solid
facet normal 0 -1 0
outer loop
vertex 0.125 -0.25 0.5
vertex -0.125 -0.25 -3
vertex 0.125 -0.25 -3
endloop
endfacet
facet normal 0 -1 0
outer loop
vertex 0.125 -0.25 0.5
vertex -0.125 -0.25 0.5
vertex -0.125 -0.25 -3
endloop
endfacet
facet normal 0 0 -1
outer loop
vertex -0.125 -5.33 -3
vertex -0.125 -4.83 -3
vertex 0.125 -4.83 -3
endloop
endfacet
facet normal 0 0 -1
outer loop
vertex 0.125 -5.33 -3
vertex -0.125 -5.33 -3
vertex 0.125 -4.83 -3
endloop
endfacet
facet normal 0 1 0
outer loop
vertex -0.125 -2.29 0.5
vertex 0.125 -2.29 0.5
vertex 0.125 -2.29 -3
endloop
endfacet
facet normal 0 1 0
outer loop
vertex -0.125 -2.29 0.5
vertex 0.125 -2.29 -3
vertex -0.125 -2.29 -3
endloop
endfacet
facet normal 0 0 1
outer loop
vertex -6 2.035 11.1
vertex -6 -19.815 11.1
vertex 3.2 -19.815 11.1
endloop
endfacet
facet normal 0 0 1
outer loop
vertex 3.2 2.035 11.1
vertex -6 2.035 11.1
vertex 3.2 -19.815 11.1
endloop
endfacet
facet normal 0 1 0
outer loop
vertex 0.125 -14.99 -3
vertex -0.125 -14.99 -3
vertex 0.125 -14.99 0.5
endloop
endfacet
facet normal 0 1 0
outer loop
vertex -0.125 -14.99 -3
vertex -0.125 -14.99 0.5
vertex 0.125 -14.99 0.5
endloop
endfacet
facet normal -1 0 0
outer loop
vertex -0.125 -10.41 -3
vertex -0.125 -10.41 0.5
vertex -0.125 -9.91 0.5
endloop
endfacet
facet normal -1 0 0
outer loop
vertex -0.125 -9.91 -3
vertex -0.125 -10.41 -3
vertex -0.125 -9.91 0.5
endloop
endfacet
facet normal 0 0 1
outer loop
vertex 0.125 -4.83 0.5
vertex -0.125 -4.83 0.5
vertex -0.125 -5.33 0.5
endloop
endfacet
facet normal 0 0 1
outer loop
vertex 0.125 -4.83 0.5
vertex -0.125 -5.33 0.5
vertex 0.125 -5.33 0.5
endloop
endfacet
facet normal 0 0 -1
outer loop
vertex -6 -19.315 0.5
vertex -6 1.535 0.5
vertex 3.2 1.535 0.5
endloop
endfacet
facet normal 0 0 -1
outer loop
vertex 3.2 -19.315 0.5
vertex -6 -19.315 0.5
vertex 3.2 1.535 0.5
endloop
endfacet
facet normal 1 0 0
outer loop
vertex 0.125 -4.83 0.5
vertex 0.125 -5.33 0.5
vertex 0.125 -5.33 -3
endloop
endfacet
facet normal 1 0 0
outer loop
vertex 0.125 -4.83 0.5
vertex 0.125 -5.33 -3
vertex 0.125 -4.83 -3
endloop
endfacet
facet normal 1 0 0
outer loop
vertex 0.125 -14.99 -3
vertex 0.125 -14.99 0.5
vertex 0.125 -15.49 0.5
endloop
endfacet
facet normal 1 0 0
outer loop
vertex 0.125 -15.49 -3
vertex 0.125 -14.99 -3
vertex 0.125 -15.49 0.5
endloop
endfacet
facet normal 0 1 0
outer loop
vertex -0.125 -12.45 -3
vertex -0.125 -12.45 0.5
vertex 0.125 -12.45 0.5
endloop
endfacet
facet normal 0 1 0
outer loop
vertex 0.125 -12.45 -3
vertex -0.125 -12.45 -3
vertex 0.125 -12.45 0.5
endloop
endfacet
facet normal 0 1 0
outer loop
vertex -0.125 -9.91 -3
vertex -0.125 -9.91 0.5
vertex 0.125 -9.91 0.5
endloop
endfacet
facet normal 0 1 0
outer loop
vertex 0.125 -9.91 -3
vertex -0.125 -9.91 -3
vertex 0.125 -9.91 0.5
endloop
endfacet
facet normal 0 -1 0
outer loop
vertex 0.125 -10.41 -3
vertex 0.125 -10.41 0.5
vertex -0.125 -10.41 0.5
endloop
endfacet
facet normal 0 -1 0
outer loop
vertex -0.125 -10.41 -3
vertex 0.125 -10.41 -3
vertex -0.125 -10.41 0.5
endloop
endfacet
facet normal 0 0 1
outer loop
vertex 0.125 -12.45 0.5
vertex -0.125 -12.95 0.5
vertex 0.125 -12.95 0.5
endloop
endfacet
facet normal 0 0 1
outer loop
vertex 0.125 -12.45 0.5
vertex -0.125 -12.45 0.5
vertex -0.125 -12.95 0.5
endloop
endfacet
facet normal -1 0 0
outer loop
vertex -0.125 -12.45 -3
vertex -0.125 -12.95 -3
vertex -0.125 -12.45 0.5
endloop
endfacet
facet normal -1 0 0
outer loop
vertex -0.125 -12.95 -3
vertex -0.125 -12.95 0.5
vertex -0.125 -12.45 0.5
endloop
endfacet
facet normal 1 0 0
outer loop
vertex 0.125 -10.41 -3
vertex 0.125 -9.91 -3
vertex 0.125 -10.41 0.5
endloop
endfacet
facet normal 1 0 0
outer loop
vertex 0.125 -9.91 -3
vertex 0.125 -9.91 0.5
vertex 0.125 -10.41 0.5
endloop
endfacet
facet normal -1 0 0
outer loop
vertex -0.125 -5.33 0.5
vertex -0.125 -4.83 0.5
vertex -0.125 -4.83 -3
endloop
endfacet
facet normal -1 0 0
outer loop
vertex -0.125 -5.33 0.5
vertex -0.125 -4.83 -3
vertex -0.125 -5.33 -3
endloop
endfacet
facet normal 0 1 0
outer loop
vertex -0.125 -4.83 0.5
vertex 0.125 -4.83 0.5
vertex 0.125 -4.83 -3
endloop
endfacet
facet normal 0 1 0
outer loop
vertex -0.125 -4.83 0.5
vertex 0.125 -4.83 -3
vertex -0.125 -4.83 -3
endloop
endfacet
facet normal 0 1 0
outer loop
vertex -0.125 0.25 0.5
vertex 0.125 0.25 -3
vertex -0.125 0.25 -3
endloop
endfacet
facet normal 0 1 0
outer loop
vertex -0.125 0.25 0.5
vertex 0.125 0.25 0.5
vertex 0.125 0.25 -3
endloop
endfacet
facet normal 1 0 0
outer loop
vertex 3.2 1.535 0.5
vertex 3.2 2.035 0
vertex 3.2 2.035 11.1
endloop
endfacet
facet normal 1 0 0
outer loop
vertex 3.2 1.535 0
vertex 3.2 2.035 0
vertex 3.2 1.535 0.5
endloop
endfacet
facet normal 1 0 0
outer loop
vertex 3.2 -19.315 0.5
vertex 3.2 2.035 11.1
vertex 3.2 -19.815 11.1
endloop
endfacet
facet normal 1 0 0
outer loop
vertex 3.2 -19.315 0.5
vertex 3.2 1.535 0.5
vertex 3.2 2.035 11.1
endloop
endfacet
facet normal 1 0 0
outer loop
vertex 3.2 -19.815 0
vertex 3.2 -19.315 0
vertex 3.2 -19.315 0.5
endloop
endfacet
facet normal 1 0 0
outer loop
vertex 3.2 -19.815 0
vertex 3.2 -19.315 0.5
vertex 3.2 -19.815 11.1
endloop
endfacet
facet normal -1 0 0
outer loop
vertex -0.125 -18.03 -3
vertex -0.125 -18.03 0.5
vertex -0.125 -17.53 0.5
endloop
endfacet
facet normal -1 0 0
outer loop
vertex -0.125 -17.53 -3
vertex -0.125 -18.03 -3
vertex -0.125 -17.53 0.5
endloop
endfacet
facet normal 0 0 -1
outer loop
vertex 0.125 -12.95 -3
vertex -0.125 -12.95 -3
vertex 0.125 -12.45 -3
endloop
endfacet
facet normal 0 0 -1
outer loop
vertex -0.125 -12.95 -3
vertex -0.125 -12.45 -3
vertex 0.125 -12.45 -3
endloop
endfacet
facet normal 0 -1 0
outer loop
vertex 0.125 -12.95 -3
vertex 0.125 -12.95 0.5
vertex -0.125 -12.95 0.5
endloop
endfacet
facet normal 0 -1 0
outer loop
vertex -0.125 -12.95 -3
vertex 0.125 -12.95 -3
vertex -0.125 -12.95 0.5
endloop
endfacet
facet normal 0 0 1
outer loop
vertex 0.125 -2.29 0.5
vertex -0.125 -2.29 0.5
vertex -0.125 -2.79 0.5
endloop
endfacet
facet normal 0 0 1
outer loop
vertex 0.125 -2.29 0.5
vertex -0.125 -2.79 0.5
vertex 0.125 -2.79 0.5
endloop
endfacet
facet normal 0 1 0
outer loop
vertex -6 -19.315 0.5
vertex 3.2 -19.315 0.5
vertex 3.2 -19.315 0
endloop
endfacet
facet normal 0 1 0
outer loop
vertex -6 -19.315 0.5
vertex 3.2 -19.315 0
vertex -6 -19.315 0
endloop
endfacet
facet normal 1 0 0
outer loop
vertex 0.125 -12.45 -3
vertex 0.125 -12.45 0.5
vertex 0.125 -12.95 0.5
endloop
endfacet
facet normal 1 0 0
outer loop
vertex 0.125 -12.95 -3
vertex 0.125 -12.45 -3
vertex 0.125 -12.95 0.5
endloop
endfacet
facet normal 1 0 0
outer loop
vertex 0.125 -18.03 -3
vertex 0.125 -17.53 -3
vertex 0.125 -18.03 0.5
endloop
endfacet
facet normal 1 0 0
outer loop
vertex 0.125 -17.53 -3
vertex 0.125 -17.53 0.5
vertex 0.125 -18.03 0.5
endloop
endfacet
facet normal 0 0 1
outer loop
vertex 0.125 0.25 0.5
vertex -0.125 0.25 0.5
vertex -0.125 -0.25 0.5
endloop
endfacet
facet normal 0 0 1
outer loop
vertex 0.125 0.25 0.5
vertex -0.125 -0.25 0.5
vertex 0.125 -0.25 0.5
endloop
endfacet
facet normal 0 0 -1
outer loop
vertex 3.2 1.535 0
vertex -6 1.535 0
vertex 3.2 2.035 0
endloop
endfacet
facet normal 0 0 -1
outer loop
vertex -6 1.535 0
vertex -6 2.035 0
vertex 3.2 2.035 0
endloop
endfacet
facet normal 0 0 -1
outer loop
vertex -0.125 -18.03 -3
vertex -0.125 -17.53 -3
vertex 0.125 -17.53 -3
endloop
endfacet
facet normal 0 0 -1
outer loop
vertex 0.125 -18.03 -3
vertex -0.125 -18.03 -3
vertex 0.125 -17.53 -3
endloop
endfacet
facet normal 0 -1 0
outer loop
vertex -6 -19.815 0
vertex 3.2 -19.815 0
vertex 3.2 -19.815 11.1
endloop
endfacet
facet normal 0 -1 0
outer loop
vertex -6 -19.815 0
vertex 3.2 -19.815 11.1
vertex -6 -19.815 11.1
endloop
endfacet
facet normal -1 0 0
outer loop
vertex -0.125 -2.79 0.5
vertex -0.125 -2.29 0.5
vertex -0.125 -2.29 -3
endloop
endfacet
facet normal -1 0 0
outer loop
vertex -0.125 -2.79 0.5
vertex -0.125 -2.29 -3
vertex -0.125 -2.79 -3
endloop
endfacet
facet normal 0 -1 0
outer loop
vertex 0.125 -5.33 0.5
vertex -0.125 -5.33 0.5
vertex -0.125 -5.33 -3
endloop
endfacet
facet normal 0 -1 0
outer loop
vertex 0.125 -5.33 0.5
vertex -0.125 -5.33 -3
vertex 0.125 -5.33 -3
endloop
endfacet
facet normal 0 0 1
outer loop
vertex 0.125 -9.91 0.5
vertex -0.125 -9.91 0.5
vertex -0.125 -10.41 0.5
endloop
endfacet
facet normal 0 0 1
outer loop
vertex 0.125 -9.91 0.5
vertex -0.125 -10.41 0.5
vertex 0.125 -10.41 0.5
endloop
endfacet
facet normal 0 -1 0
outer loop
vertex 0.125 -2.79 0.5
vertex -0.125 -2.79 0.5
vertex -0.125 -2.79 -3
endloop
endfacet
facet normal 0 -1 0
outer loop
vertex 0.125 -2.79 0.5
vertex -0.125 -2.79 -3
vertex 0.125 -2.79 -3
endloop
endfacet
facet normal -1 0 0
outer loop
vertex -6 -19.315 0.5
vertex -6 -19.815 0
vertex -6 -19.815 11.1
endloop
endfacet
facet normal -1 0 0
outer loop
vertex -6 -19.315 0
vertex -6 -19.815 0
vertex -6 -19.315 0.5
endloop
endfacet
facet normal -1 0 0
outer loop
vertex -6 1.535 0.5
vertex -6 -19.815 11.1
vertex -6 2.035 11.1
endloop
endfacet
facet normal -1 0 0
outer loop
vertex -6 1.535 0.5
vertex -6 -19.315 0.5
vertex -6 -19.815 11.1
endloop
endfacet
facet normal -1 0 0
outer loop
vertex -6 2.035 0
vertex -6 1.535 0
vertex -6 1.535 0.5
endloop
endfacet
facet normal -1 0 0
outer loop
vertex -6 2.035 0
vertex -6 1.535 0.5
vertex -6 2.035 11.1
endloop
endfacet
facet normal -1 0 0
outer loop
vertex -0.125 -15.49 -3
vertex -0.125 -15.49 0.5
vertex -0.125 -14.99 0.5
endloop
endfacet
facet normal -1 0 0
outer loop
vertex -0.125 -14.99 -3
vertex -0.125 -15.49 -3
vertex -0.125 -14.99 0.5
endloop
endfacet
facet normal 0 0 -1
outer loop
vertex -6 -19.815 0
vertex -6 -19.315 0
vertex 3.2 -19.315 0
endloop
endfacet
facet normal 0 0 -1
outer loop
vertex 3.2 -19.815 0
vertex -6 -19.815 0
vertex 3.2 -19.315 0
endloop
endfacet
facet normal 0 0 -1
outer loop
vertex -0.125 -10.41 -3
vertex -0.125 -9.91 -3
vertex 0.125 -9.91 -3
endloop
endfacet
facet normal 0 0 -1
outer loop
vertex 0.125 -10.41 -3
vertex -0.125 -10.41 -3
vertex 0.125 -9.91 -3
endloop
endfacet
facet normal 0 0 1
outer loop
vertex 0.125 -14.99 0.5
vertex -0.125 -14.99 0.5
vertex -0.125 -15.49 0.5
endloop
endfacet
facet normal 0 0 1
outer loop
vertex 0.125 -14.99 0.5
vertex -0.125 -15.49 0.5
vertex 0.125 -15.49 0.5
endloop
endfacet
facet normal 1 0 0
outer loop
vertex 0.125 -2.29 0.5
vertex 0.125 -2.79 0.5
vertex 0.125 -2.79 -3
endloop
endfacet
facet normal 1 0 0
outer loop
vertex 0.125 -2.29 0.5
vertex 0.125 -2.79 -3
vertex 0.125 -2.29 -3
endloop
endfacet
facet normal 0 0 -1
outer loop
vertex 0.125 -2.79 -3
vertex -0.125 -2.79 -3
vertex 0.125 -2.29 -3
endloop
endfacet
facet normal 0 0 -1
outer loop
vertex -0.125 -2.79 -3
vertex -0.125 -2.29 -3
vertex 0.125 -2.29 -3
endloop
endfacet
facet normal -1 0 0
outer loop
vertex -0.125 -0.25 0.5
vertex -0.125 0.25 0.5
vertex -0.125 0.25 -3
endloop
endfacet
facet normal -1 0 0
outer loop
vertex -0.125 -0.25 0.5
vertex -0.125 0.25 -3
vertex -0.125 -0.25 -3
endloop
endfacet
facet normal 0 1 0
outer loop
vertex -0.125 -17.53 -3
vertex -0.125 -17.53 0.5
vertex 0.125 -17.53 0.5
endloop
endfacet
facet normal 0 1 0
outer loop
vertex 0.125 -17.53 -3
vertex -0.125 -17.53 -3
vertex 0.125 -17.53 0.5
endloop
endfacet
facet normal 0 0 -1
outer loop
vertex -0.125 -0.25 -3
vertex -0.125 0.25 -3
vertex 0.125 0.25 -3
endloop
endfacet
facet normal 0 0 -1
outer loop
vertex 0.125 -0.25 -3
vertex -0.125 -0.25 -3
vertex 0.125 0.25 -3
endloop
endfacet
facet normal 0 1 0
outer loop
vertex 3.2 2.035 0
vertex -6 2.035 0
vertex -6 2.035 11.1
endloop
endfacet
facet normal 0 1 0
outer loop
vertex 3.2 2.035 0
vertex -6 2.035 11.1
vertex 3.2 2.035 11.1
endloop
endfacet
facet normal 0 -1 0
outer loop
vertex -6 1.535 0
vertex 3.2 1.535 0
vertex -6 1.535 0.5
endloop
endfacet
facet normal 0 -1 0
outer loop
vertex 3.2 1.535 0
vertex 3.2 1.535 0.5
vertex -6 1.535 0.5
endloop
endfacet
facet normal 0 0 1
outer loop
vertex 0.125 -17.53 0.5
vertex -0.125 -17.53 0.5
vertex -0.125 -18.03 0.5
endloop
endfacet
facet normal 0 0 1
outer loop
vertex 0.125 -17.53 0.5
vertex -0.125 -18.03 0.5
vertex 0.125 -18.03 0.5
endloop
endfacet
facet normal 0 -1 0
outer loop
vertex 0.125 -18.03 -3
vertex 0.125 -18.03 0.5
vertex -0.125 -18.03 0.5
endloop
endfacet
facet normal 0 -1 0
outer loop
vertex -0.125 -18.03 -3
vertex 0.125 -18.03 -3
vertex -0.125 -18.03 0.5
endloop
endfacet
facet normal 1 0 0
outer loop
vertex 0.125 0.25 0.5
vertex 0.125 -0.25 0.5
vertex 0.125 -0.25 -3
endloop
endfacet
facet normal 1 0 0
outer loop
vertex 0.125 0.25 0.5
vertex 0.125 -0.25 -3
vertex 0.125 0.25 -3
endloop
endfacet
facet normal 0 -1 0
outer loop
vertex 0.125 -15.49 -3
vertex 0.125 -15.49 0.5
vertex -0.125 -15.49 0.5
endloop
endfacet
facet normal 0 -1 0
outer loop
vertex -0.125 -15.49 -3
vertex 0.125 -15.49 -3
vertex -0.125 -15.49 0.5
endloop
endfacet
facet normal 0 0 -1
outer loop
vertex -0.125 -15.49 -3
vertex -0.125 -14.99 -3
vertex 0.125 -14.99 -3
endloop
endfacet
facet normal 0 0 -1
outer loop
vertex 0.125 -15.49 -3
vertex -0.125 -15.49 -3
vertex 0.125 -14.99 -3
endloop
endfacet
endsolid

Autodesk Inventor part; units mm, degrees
ref_plane "YZ Plane" through (0, 0, 0) normal (1, 0, 0) x (0, 1, 0)
ref_plane "XZ Plane" through (0, 0, 0) normal (0, 1, 0) x (-1, 0, 0)
ref_plane "XY Plane" through (0, 0, 0) normal (0, 0, 1) x (1, 0, 0)
sketch "Sketch2" plane through (0, 0, 0) normal (0, 0, 1) x (1, 0, 0)
  line L0 (-6, 2.035) -> (3.2, 2.035)
  line L1 (3.2, 2.035) -> (3.2, -19.815)
  line L2 (3.2, -19.815) -> (-6, -19.815)
  line L3 (-6, -19.815) -> (-6, 2.035)
  line L4 (-0.125, -0.25) -> (0.125, -0.25)
  line L5 (0.125, -0.25) -> (0.125, 0.25)
  line L6 (0.125, 0.25) -> (-0.125, 0.25)
  line L7 (-0.125, 0.25) -> (-0.125, -0.25)
  line L8 (-0.125, -0.25) -> (0.125, 0.25) construction
  line L9 (0.125, -0.25) -> (-0.125, 0.25) construction
  line L10 (-0.125, -2.79) -> (0.125, -2.79)
  line L11 (0.125, -2.79) -> (0.125, -2.29)
  line L12 (0.125, -2.29) -> (-0.125, -2.29)
  line L13 (-0.125, -2.29) -> (-0.125, -2.79)
  line L14 (-0.125, -2.79) -> (0.125, -2.29) construction
  line L15 (0.125, -2.79) -> (-0.125, -2.29) construction
  line L16 (-0.125, -9.91) -> (0.125, -9.91)
  line L17 (0.125, -9.91) -> (0.125, -10.41)
  line L18 (0.125, -10.41) -> (-0.125, -10.41)
  line L19 (-0.125, -10.41) -> (-0.125, -9.91)
  line L20 (-0.125, -9.91) -> (0.125, -10.41) construction
  line L21 (0.125, -9.91) -> (-0.125, -10.41) construction
  line L22 (-0.125, -12.45) -> (0.125, -12.45)
  line L23 (0.125, -12.45) -> (0.125, -12.95)
  line L24 (-0.125, -12.95) -> (-0.125, -12.45)
  line L25 (-0.125, -12.45) -> (0.125, -12.95) construction
  line L26 (0.125, -12.45) -> (-0.125, -12.95) construction
  line L27 (0.125, -12.95) -> (-0.125, -12.95)
  line L28 (-0.125, -14.99) -> (0.125, -14.99)
  line L29 (0.125, -14.99) -> (0.125, -15.49)
  line L30 (-0.125, -15.49) -> (-0.125, -14.99)
  line L31 (-0.125, -14.99) -> (0.125, -15.49) construction
  line L32 (0.125, -14.99) -> (-0.125, -15.49) construction
  line L33 (0.125, -15.49) -> (-0.125, -15.49)
  line L34 (-6, 2.035) -> (3.2, 2.035)
  line L35 (3.2, 2.035) -> (3.2, 1.535)
  line L36 (3.2, 1.535) -> (-6, 1.535)
  line L37 (-6, 1.535) -> (-6, 2.035)
  line L38 (-6, -19.815) -> (3.2, -19.815)
  line L39 (3.2, -19.815) -> (3.2, -19.315)
  line L40 (3.2, -19.315) -> (-6, -19.315)
  line L41 (-6, -19.315) -> (-6, -19.815)
  line L42 (-0.125, -5.33) -> (0.125, -5.33)
  line L43 (0.125, -5.33) -> (0.125, -4.83)
  line L44 (0.125, -4.83) -> (-0.125, -4.83)
  line L45 (-0.125, -4.83) -> (-0.125, -5.33)
  line L46 (-0.125, -5.33) -> (0.125, -4.83) construction
  line L47 (0.125, -5.33) -> (-0.125, -4.83) construction
  line L48 (-0.125, -17.53) -> (0.125, -17.53)
  line L49 (0.125, -17.53) -> (0.125, -18.03)
  line L50 (-0.125, -18.03) -> (-0.125, -17.53)
  line L51 (-0.125, -17.53) -> (0.125, -18.03) construction
  line L52 (0.125, -17.53) -> (-0.125, -18.03) construction
  line L53 (0.125, -18.03) -> (-0.125, -18.03)
  point P0 (0, 0)
  point P1 (0, -2.54)
  point P2 (0, -10.16)
  point P3 (0, -12.7)
  point P4 (0, -15.24)
  point P5 (0, -5.08)
  point P6 (0, -17.78)
  dimension "d37" = 2.035
  dimension "d38" = 3.2
  dimension "d40" = 9.2
  dimension "d41" = 0.25
  dimension "d42" = 0.5
  dimension "d45" = 2.54
  dimension "d50" = 0.25
  dimension "d51" = 0.5
  dimension "d52" = 0
  dimension "d53" = 10.16
  dimension "d56" = 2.54
  dimension "d61" = 0.5
  dimension "d62" = 0.5
  dimension "d72" = 21.85
extrude "Extrusion4" add sketch "Sketch2" along normal blind 10.6 contours L0 L1 L36 L3 | L36 L1 L40 L3 | L40 L1 L2 L3 | L7 L6 L5 L4 | L13 L12 L11 L10 | L16 L17 L18 L19 | L22 L23 L27 L24 | L28 L29 L33 L30 | L45 L44 L43 L42 | L48 L49 L53 L50
extrude "Extrusion5" add sketch "Sketch2" against normal blind 0.5 contours L0 L1 L36 L3 | L40 L1 L2 L3
extrude "Extrusion6" add sketch "Sketch2" against normal blind 3.5 separate body contours L7 L6 L5 L4 | L13 L12 L11 L10 | L16 L17 L18 L19 | L22 L23 L27 L24 | L28 L29 L33 L30 | L45 L44 L43 L42 | L48 L49 L53 L50
move or copy body "Move Body1" bodies to move or copy 1 2 copy no translate (0, 0, 0.5)
equation "\"d50\" = d41"
equation "\"d51\" = d42"
properties part number "Converter_DCDC_XP_POWER-ITXxxxx_SIP_THT"
